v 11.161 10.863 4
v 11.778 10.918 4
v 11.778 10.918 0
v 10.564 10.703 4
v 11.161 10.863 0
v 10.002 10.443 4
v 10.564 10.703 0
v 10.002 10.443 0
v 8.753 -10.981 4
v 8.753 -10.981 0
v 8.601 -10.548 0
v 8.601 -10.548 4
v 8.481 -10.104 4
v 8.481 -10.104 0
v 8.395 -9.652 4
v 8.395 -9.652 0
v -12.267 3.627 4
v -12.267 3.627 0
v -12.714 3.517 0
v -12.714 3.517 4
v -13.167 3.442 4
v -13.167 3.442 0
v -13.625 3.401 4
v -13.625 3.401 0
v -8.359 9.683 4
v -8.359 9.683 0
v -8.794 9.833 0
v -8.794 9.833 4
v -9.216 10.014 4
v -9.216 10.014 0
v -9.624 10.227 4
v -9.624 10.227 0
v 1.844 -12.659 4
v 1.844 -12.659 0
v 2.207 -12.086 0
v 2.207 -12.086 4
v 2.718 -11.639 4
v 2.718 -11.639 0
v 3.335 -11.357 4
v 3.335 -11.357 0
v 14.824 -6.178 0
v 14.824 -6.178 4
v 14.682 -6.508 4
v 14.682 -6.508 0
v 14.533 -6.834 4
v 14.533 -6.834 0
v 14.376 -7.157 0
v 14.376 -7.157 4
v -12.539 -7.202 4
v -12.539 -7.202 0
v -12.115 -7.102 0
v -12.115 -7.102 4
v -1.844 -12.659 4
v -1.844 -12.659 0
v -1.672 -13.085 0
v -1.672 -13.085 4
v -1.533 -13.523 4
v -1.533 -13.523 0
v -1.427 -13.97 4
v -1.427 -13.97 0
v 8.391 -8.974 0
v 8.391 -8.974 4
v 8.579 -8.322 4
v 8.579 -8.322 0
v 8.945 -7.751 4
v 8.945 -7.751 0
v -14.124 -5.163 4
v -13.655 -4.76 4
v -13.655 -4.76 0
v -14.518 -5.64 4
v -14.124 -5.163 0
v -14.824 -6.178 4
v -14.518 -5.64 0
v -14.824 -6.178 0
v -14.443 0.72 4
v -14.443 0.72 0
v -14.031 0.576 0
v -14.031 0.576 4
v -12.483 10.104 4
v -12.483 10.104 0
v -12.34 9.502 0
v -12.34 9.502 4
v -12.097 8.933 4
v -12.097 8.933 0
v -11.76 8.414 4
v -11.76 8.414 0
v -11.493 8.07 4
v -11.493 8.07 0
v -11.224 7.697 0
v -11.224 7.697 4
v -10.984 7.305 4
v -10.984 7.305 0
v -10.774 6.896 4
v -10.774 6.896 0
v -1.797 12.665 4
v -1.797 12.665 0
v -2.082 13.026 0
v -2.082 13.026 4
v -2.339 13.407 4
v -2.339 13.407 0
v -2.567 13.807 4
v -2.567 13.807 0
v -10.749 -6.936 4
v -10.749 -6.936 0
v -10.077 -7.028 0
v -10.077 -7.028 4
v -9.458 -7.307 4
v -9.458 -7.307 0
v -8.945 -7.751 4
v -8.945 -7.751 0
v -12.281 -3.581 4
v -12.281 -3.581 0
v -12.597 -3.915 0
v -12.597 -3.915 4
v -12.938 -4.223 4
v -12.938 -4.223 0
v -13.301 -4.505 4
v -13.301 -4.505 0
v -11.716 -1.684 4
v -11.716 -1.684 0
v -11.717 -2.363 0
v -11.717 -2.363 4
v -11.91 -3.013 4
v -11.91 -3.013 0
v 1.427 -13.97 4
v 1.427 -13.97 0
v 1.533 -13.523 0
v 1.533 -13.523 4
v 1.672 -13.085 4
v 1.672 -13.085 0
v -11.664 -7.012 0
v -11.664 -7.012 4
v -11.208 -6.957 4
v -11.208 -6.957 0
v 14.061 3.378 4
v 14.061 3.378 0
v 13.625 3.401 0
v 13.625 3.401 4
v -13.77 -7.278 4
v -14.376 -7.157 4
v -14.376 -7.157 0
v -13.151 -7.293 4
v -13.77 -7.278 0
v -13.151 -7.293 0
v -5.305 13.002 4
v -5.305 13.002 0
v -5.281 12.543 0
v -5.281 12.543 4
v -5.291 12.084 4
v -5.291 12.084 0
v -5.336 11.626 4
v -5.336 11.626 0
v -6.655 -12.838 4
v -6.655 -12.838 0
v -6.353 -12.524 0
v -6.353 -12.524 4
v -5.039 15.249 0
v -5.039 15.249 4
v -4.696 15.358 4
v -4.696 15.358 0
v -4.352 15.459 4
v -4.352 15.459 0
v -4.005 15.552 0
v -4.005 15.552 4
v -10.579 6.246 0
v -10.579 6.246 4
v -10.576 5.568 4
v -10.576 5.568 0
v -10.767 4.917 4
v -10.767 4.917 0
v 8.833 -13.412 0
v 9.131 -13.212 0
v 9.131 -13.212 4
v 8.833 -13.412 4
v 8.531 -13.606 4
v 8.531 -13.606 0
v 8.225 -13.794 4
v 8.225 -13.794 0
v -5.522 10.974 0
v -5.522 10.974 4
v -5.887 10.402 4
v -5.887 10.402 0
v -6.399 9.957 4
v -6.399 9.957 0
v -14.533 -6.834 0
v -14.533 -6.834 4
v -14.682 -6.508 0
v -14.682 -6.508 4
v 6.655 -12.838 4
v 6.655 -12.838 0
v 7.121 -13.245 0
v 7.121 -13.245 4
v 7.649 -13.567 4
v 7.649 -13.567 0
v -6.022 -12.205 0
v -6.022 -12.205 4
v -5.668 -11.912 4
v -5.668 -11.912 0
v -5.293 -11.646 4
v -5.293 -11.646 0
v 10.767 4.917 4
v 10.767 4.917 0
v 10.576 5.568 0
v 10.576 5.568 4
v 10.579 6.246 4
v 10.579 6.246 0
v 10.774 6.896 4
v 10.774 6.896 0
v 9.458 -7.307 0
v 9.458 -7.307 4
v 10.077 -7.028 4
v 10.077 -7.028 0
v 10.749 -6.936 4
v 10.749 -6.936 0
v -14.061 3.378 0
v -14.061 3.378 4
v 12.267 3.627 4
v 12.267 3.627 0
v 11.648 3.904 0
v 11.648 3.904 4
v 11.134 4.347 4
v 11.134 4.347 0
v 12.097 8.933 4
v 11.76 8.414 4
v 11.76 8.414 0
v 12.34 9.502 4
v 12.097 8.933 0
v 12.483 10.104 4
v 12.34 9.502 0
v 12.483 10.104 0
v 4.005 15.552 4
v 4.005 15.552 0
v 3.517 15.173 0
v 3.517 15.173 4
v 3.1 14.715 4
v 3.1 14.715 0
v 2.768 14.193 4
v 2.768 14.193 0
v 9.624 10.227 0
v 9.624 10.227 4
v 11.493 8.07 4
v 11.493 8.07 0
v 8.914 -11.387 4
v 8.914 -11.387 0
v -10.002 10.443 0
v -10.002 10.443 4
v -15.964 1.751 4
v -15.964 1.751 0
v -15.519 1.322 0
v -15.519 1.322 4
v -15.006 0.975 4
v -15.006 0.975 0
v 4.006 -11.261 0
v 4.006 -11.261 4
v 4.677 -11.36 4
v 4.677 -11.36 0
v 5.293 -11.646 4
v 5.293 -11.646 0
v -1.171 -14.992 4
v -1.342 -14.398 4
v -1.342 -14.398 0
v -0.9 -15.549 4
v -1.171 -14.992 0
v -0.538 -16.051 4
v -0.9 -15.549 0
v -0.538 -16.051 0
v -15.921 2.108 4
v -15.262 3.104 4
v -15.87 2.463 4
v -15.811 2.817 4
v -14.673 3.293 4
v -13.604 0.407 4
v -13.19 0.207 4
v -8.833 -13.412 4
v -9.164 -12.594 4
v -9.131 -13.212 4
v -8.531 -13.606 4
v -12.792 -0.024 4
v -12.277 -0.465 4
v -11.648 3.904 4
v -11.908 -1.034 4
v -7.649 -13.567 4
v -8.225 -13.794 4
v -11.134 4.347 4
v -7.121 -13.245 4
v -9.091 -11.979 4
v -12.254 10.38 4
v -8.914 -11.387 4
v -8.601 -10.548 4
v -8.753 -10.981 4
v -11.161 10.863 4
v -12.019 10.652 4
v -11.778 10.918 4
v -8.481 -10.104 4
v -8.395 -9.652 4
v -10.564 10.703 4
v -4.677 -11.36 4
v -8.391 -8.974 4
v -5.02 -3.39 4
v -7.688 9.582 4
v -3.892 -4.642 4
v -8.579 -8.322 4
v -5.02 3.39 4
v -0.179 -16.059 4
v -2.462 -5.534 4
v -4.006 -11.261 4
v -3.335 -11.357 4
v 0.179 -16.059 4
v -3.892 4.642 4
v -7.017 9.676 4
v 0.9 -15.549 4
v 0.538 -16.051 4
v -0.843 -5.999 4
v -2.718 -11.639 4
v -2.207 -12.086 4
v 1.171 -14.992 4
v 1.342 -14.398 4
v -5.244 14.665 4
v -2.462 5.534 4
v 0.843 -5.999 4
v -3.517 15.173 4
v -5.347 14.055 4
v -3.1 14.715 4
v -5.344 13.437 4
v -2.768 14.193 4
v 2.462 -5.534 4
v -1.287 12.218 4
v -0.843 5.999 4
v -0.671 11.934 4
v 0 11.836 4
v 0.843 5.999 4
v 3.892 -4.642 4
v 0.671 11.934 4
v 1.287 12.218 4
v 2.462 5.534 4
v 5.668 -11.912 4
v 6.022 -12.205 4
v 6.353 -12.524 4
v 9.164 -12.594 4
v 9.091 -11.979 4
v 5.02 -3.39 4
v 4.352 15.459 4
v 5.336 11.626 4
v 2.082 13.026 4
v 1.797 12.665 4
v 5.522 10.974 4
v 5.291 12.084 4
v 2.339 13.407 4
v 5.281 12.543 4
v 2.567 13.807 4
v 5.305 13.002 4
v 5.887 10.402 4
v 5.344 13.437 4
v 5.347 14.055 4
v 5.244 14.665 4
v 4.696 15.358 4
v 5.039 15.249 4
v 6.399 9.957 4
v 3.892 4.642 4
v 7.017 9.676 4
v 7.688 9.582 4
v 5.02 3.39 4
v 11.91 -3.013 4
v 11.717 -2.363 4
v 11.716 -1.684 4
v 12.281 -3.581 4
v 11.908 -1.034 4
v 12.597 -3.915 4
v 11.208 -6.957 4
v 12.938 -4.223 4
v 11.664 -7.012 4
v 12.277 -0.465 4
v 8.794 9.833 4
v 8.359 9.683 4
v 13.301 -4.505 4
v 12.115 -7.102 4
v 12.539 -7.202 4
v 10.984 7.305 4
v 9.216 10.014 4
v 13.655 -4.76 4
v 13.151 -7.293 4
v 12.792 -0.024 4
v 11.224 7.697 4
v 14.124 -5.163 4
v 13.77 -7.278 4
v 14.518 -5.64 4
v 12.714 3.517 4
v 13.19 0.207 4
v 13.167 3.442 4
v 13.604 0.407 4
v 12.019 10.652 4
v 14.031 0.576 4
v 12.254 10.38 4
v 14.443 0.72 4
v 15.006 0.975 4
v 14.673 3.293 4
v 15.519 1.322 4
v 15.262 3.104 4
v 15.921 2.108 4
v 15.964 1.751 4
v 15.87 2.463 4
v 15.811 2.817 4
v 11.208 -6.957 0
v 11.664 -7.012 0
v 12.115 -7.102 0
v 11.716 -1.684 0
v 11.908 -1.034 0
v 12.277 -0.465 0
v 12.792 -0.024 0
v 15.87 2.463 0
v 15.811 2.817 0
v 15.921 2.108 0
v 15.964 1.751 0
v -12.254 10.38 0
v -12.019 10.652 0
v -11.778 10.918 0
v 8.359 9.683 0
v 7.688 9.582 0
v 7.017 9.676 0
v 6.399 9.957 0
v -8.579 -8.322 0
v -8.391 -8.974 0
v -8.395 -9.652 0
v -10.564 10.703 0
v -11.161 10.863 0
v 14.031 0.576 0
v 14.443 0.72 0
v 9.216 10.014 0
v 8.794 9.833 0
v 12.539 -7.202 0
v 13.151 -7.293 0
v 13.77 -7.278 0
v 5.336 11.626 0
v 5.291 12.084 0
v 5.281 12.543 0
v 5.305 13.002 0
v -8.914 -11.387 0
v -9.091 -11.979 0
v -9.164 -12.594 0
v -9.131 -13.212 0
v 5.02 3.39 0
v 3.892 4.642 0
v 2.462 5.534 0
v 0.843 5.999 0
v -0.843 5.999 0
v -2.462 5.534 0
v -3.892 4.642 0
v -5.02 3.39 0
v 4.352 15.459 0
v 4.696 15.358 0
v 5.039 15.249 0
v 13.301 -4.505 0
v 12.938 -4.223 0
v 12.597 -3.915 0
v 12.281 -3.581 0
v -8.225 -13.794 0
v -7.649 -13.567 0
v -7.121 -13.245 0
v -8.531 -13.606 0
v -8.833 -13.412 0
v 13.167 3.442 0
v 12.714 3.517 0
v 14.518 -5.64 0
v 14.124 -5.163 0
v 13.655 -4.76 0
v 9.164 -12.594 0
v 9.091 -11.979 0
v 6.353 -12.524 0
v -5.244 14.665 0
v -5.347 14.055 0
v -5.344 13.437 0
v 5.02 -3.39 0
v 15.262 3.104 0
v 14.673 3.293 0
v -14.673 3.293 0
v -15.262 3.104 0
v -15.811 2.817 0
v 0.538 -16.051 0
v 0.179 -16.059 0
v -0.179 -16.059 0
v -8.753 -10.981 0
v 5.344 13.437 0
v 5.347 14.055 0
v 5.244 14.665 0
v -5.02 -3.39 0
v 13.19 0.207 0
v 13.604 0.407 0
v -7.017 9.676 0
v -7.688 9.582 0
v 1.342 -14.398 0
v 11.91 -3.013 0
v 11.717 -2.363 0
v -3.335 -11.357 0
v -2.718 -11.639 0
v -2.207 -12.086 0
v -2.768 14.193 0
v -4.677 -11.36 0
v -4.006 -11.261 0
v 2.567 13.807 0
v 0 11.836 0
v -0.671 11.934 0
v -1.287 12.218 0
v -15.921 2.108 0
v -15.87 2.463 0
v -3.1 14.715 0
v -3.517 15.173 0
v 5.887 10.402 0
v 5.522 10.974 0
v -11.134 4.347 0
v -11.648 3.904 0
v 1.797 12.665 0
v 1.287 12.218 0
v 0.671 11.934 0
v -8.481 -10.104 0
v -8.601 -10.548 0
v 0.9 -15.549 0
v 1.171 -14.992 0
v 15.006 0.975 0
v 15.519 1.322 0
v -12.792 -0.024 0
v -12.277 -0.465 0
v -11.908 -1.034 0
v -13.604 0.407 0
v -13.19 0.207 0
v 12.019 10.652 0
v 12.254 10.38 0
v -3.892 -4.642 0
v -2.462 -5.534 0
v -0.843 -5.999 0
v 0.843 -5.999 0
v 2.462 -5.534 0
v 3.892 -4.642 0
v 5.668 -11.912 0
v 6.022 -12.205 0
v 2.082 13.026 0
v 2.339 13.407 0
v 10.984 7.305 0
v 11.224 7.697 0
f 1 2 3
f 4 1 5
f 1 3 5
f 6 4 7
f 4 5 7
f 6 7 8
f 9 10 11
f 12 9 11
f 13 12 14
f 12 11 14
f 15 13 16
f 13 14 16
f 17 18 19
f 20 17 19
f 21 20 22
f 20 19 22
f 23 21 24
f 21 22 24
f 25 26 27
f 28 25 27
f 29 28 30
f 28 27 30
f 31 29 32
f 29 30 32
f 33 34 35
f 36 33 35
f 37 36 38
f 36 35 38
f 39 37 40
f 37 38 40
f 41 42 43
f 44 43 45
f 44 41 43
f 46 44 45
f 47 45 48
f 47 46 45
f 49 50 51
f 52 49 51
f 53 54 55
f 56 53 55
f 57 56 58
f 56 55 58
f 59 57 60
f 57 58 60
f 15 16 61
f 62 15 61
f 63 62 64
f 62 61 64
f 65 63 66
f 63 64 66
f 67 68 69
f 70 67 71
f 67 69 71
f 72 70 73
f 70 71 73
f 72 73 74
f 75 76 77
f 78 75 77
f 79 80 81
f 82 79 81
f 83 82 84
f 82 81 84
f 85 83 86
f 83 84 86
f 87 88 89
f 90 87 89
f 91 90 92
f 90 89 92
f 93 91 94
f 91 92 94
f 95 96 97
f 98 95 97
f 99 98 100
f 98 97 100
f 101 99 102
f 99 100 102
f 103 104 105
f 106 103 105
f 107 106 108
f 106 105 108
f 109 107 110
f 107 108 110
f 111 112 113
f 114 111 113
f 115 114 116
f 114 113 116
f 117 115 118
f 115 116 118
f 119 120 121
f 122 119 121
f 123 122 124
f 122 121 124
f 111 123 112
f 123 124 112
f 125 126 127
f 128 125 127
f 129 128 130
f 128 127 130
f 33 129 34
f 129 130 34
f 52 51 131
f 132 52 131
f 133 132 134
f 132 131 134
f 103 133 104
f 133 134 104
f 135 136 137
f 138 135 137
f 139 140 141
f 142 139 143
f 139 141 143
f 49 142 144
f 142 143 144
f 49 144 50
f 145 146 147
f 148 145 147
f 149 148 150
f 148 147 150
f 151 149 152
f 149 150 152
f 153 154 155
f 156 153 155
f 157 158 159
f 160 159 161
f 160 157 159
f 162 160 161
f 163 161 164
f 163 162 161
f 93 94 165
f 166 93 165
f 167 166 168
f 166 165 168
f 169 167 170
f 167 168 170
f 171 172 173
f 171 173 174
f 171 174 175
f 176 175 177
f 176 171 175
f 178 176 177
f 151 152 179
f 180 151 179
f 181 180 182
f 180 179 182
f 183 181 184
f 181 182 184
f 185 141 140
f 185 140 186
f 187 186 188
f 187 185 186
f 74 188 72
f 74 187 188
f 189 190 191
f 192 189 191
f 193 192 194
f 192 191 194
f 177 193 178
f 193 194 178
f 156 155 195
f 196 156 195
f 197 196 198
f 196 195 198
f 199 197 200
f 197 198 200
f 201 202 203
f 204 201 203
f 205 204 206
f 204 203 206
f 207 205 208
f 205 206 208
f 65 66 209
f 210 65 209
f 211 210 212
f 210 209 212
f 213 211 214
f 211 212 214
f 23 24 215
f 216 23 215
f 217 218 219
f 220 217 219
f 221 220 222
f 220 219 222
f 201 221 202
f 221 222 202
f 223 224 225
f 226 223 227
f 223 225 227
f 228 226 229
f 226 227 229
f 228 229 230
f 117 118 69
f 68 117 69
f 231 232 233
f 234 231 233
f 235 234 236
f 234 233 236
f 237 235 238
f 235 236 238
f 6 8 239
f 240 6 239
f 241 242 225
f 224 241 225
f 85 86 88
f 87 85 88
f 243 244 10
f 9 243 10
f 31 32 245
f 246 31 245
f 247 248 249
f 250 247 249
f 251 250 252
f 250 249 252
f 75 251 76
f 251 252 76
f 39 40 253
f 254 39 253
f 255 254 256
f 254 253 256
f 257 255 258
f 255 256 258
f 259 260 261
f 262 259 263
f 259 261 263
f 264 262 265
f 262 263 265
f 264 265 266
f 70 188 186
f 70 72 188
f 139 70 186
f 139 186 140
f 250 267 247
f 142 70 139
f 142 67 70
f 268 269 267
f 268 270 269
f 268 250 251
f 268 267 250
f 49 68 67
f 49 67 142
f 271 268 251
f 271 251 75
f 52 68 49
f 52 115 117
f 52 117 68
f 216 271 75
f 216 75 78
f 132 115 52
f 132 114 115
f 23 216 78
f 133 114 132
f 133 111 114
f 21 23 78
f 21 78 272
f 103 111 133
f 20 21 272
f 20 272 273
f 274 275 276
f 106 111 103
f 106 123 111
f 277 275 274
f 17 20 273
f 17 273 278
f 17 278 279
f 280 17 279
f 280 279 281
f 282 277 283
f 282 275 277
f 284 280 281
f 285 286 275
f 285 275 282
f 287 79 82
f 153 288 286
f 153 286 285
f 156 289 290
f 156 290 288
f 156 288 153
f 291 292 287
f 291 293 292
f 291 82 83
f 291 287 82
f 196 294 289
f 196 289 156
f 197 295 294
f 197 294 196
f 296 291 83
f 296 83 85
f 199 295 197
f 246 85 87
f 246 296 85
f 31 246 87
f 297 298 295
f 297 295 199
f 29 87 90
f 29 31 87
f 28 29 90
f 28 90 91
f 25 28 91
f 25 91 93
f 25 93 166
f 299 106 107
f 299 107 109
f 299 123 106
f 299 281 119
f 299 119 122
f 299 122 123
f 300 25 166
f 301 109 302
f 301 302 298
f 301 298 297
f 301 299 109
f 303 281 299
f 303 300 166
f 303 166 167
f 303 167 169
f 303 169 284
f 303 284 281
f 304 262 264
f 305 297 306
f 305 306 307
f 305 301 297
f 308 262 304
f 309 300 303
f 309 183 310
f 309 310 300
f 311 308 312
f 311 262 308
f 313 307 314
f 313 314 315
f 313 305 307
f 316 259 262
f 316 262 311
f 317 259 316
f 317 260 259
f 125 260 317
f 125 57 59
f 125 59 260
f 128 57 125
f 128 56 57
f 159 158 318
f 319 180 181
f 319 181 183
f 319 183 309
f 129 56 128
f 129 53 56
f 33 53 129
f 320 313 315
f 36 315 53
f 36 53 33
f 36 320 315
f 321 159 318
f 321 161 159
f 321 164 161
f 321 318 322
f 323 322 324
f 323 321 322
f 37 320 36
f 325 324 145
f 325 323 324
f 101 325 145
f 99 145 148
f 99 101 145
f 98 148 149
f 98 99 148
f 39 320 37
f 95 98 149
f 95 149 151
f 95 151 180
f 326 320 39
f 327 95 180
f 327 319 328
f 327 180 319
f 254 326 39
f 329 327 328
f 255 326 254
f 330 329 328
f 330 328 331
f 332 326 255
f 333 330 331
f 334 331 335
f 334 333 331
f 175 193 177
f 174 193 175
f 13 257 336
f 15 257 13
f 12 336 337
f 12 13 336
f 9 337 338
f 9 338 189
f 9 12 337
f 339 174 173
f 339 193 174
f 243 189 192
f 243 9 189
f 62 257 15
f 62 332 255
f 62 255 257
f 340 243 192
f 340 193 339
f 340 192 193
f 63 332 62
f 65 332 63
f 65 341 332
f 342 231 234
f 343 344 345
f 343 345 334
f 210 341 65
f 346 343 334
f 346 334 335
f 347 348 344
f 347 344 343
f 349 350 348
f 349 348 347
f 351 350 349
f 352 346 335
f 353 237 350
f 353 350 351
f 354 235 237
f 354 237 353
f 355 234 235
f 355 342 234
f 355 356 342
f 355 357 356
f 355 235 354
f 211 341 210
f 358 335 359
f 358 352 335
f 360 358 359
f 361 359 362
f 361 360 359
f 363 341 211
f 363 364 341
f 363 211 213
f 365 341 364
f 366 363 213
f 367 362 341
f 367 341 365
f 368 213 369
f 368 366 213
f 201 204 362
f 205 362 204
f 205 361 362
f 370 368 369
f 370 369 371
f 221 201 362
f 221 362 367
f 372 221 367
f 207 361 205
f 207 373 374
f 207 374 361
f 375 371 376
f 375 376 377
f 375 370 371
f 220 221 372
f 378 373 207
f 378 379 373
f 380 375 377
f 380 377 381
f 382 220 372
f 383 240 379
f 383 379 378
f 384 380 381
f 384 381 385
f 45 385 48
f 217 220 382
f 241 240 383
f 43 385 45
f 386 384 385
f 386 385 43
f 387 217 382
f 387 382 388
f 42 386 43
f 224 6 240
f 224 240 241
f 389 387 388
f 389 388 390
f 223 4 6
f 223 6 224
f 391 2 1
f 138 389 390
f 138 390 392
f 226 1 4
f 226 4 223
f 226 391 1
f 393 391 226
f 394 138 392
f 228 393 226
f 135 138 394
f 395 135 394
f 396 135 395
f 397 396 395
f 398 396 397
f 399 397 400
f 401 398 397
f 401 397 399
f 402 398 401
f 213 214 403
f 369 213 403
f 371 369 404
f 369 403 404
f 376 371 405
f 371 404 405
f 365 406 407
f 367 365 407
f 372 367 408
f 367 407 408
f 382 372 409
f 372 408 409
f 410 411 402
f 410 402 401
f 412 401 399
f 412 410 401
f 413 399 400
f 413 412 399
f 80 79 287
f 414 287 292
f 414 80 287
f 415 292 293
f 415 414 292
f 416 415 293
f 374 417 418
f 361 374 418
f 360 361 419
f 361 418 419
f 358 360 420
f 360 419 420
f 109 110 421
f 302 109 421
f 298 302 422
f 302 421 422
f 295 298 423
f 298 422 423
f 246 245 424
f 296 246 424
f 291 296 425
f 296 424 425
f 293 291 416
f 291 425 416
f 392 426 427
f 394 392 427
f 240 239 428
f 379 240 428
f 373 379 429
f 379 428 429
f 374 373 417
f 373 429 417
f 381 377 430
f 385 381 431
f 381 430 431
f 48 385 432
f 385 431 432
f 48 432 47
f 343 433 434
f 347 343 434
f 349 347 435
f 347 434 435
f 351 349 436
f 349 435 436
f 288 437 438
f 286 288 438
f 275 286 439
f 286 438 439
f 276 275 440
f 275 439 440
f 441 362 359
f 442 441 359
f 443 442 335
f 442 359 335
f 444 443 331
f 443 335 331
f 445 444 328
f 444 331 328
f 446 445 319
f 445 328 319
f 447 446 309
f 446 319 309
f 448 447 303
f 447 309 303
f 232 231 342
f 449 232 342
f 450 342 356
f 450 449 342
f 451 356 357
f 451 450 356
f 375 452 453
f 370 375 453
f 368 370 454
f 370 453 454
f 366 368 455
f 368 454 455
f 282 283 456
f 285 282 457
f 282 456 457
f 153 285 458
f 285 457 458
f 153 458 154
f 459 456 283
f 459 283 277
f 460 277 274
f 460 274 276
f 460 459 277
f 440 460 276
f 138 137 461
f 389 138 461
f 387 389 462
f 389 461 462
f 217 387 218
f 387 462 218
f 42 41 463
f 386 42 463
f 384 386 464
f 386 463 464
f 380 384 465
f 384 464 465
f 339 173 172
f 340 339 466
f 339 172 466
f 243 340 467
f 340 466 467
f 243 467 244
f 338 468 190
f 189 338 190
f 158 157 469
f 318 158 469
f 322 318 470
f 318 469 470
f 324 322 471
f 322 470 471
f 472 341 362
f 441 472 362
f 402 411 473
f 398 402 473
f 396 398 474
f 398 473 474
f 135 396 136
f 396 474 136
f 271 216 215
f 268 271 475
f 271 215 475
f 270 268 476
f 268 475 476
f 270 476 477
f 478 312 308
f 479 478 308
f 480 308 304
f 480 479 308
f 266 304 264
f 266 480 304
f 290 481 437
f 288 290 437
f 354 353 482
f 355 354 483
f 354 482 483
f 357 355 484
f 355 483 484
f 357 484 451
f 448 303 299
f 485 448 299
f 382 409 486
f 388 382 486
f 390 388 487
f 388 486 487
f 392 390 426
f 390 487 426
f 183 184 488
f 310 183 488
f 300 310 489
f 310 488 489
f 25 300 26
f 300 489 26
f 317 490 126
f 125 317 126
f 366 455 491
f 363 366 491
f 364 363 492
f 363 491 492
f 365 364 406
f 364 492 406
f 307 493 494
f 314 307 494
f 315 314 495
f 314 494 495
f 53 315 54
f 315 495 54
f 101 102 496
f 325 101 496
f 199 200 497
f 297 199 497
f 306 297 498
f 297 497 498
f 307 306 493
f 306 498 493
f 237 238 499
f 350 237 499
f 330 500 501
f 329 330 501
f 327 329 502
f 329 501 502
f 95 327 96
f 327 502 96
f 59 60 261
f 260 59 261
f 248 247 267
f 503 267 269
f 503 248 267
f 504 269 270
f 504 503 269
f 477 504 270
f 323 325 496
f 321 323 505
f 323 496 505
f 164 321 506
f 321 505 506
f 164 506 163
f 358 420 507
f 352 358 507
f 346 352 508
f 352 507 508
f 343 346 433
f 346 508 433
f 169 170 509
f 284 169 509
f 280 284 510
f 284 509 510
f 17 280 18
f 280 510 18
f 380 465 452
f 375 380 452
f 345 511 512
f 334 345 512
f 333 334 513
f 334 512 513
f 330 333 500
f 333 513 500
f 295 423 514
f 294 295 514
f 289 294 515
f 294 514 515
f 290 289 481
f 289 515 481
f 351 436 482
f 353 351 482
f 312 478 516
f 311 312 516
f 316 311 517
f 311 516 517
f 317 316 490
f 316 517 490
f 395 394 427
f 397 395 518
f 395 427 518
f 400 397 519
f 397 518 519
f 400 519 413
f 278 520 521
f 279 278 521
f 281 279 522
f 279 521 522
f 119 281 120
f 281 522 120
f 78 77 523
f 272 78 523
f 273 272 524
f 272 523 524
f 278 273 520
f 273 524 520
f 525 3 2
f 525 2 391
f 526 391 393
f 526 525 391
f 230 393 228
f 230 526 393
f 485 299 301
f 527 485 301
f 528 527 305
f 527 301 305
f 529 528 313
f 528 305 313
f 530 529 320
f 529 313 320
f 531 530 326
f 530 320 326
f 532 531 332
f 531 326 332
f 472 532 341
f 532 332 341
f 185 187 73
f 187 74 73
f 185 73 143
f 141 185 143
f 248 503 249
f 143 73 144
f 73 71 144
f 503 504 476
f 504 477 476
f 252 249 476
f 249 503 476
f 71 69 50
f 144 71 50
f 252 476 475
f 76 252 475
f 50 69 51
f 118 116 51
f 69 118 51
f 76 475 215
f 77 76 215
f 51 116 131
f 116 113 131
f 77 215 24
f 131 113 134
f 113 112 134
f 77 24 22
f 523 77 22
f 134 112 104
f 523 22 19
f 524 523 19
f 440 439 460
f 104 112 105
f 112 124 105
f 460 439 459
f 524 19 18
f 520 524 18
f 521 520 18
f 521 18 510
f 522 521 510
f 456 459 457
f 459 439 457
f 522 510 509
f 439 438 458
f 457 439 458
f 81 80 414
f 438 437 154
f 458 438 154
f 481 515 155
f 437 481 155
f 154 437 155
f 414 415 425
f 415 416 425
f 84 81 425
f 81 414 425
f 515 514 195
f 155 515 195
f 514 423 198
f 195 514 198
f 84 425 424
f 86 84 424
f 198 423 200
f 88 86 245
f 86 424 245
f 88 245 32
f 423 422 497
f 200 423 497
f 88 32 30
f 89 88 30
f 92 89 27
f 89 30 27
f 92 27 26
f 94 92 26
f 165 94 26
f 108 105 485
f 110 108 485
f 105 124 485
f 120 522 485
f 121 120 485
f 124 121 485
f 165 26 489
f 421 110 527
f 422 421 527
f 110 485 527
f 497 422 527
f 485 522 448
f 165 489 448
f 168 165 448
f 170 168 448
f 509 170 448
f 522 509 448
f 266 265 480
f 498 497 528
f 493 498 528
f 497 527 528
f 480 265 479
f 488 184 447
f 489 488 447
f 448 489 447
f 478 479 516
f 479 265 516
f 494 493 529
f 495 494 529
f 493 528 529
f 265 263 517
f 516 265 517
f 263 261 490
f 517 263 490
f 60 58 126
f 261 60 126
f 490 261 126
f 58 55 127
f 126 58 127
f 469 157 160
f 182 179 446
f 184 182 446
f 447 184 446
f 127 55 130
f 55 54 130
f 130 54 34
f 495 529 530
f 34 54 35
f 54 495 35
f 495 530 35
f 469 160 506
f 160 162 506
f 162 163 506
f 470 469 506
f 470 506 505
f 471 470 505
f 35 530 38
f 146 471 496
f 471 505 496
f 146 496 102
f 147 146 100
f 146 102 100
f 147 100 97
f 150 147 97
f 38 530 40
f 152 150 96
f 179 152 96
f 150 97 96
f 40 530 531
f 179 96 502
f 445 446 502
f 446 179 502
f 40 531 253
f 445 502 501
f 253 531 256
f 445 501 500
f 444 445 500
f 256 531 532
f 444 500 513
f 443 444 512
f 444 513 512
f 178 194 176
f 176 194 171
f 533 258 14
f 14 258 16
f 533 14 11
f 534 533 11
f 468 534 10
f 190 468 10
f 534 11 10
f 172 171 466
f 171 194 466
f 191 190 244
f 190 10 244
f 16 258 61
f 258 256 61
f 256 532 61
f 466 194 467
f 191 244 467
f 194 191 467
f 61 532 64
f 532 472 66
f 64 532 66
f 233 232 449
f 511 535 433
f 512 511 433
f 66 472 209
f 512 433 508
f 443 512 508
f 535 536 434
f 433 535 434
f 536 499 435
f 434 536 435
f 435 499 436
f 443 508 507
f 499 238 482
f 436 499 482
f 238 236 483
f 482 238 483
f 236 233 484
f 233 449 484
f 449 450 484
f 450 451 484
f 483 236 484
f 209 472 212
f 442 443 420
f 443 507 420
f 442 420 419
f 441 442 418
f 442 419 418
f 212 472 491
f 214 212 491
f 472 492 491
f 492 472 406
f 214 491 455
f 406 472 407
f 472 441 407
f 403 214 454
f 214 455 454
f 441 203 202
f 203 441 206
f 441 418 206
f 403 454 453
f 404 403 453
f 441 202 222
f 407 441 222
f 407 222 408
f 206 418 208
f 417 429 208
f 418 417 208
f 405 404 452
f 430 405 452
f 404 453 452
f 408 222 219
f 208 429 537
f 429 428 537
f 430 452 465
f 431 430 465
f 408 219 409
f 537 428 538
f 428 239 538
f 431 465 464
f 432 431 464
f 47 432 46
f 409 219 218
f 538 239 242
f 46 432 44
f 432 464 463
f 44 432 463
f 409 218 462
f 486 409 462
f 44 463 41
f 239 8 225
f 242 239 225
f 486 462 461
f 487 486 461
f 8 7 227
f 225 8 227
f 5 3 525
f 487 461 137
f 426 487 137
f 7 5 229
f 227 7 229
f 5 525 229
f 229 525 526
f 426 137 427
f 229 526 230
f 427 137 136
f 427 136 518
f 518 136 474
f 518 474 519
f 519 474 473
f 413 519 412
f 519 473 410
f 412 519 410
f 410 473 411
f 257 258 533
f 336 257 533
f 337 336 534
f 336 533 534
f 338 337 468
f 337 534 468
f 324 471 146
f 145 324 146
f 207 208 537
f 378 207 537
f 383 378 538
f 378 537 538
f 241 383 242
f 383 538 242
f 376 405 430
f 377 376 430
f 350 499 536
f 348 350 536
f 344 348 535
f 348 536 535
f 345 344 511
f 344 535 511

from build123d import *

# Parameters (mm, degrees)
ESQUISSE2_R                  = 11.836112132
BOSS_EXTRU_1_DEPTH           = 4
BOSS_EXTRU_2_START           = -4
BOSS_EXTRU_2_DEPTH           = 4
R_P_TITION_CIRCULAIRE1_COUNT = 11
ESQUISSE6_R                  = 16.559612132
ESQUISSE6_R_2                = 16.059612132
ENL_V_MAT_EXTRU_3_DEPTH      = 24.640803164
CUT_EXTRUDE1_DEPTH           = 10


with BuildPart() as part:
    # Esquisse2 → Boss.-Extru.1 (new body)
    with BuildSketch(Plane.XY):
        Circle(ESQUISSE2_R)
    extrude(amount=BOSS_EXTRU_1_DEPTH)

    # Esquisse3 → Boss.-Extru.2 (add)
    with BuildSketch(Plane.XY.offset(4).offset(BOSS_EXTRU_2_START)):
        with BuildLine():
            Line((-5.344448394, 13.436688428), (-5.305069319, 13.002458629))
            ThreePointArc((-5.305069319, 13.002458629), (-5.28156066, 12.313590322), (-5.335640108, 11.626445786))
            ThreePointArc((-5.335640108, 11.626445786), (-5.684064042, 10.675034327), (-6.399085338, 9.957171146))
            ThreePointArc((-6.399085338, 9.957171146), (-3.334618134, 11.356666425), (0, 11.836112132))
            ThreePointArc((0, 11.836112132), (-0.989620329, 12.053447371), (-1.797105063, 12.665453421))
            ThreePointArc((-1.797105063, 12.665453421), (-2.214097973, 13.214278633), (-2.566751555, 13.806501271))
            Line((-2.566751555, 13.806501271), (-2.768386123, 14.193088558))
            ThreePointArc((-2.768386123, 14.193088558), (-3.562335584, 15.213850424), (-4.665381866, 15.888831486))
            ThreePointArc((-4.665381866, 15.888831486), (-5.228401135, 14.72464944), (-5.344448394, 13.436688428))
        make_face()
    boss_extru_2 = extrude(amount=BOSS_EXTRU_2_DEPTH)

    # Répétition circulaire1: Boss.-Extru.2 ×11 about axis
    r_p_tition_circulaire1_axis = Axis((0, 0, 0), (0, 0, 1))
    for i in range(1, R_P_TITION_CIRCULAIRE1_COUNT):
        add(boss_extru_2.rotate(r_p_tition_circulaire1_axis, i * 360 / R_P_TITION_CIRCULAIRE1_COUNT))

    # Esquisse6 → Enlèv. mat.-Extru.3 (cut, through all)
    with BuildSketch(Plane(origin=(0, 0, 0), x_dir=(-1, 0, 0), z_dir=(0, 0, -1))):
        Circle(ESQUISSE6_R)
        Circle(ESQUISSE6_R_2, mode=Mode.SUBTRACT)
    extrude(amount=-ENL_V_MAT_EXTRU_3_DEPTH, mode=Mode.SUBTRACT)

    # Sketch1 → Cut-Extrude1 (cut)
    with BuildSketch(Plane.XY.offset(4)):
        with BuildLine():
            Line((-5.02, 3.39), (-5.02, -3.39))
            ThreePointArc((-5.02, -3.39), (0, -6.05743345), (5.02, -3.39))
            Line((5.02, -3.39), (5.02, 3.39))
            ThreePointArc((5.02, 3.39), (0, 6.05743345), (-5.02, 3.39))
        make_face()
    extrude(amount=-CUT_EXTRUDE1_DEPTH, mode=Mode.SUBTRACT)


solid = part.part
